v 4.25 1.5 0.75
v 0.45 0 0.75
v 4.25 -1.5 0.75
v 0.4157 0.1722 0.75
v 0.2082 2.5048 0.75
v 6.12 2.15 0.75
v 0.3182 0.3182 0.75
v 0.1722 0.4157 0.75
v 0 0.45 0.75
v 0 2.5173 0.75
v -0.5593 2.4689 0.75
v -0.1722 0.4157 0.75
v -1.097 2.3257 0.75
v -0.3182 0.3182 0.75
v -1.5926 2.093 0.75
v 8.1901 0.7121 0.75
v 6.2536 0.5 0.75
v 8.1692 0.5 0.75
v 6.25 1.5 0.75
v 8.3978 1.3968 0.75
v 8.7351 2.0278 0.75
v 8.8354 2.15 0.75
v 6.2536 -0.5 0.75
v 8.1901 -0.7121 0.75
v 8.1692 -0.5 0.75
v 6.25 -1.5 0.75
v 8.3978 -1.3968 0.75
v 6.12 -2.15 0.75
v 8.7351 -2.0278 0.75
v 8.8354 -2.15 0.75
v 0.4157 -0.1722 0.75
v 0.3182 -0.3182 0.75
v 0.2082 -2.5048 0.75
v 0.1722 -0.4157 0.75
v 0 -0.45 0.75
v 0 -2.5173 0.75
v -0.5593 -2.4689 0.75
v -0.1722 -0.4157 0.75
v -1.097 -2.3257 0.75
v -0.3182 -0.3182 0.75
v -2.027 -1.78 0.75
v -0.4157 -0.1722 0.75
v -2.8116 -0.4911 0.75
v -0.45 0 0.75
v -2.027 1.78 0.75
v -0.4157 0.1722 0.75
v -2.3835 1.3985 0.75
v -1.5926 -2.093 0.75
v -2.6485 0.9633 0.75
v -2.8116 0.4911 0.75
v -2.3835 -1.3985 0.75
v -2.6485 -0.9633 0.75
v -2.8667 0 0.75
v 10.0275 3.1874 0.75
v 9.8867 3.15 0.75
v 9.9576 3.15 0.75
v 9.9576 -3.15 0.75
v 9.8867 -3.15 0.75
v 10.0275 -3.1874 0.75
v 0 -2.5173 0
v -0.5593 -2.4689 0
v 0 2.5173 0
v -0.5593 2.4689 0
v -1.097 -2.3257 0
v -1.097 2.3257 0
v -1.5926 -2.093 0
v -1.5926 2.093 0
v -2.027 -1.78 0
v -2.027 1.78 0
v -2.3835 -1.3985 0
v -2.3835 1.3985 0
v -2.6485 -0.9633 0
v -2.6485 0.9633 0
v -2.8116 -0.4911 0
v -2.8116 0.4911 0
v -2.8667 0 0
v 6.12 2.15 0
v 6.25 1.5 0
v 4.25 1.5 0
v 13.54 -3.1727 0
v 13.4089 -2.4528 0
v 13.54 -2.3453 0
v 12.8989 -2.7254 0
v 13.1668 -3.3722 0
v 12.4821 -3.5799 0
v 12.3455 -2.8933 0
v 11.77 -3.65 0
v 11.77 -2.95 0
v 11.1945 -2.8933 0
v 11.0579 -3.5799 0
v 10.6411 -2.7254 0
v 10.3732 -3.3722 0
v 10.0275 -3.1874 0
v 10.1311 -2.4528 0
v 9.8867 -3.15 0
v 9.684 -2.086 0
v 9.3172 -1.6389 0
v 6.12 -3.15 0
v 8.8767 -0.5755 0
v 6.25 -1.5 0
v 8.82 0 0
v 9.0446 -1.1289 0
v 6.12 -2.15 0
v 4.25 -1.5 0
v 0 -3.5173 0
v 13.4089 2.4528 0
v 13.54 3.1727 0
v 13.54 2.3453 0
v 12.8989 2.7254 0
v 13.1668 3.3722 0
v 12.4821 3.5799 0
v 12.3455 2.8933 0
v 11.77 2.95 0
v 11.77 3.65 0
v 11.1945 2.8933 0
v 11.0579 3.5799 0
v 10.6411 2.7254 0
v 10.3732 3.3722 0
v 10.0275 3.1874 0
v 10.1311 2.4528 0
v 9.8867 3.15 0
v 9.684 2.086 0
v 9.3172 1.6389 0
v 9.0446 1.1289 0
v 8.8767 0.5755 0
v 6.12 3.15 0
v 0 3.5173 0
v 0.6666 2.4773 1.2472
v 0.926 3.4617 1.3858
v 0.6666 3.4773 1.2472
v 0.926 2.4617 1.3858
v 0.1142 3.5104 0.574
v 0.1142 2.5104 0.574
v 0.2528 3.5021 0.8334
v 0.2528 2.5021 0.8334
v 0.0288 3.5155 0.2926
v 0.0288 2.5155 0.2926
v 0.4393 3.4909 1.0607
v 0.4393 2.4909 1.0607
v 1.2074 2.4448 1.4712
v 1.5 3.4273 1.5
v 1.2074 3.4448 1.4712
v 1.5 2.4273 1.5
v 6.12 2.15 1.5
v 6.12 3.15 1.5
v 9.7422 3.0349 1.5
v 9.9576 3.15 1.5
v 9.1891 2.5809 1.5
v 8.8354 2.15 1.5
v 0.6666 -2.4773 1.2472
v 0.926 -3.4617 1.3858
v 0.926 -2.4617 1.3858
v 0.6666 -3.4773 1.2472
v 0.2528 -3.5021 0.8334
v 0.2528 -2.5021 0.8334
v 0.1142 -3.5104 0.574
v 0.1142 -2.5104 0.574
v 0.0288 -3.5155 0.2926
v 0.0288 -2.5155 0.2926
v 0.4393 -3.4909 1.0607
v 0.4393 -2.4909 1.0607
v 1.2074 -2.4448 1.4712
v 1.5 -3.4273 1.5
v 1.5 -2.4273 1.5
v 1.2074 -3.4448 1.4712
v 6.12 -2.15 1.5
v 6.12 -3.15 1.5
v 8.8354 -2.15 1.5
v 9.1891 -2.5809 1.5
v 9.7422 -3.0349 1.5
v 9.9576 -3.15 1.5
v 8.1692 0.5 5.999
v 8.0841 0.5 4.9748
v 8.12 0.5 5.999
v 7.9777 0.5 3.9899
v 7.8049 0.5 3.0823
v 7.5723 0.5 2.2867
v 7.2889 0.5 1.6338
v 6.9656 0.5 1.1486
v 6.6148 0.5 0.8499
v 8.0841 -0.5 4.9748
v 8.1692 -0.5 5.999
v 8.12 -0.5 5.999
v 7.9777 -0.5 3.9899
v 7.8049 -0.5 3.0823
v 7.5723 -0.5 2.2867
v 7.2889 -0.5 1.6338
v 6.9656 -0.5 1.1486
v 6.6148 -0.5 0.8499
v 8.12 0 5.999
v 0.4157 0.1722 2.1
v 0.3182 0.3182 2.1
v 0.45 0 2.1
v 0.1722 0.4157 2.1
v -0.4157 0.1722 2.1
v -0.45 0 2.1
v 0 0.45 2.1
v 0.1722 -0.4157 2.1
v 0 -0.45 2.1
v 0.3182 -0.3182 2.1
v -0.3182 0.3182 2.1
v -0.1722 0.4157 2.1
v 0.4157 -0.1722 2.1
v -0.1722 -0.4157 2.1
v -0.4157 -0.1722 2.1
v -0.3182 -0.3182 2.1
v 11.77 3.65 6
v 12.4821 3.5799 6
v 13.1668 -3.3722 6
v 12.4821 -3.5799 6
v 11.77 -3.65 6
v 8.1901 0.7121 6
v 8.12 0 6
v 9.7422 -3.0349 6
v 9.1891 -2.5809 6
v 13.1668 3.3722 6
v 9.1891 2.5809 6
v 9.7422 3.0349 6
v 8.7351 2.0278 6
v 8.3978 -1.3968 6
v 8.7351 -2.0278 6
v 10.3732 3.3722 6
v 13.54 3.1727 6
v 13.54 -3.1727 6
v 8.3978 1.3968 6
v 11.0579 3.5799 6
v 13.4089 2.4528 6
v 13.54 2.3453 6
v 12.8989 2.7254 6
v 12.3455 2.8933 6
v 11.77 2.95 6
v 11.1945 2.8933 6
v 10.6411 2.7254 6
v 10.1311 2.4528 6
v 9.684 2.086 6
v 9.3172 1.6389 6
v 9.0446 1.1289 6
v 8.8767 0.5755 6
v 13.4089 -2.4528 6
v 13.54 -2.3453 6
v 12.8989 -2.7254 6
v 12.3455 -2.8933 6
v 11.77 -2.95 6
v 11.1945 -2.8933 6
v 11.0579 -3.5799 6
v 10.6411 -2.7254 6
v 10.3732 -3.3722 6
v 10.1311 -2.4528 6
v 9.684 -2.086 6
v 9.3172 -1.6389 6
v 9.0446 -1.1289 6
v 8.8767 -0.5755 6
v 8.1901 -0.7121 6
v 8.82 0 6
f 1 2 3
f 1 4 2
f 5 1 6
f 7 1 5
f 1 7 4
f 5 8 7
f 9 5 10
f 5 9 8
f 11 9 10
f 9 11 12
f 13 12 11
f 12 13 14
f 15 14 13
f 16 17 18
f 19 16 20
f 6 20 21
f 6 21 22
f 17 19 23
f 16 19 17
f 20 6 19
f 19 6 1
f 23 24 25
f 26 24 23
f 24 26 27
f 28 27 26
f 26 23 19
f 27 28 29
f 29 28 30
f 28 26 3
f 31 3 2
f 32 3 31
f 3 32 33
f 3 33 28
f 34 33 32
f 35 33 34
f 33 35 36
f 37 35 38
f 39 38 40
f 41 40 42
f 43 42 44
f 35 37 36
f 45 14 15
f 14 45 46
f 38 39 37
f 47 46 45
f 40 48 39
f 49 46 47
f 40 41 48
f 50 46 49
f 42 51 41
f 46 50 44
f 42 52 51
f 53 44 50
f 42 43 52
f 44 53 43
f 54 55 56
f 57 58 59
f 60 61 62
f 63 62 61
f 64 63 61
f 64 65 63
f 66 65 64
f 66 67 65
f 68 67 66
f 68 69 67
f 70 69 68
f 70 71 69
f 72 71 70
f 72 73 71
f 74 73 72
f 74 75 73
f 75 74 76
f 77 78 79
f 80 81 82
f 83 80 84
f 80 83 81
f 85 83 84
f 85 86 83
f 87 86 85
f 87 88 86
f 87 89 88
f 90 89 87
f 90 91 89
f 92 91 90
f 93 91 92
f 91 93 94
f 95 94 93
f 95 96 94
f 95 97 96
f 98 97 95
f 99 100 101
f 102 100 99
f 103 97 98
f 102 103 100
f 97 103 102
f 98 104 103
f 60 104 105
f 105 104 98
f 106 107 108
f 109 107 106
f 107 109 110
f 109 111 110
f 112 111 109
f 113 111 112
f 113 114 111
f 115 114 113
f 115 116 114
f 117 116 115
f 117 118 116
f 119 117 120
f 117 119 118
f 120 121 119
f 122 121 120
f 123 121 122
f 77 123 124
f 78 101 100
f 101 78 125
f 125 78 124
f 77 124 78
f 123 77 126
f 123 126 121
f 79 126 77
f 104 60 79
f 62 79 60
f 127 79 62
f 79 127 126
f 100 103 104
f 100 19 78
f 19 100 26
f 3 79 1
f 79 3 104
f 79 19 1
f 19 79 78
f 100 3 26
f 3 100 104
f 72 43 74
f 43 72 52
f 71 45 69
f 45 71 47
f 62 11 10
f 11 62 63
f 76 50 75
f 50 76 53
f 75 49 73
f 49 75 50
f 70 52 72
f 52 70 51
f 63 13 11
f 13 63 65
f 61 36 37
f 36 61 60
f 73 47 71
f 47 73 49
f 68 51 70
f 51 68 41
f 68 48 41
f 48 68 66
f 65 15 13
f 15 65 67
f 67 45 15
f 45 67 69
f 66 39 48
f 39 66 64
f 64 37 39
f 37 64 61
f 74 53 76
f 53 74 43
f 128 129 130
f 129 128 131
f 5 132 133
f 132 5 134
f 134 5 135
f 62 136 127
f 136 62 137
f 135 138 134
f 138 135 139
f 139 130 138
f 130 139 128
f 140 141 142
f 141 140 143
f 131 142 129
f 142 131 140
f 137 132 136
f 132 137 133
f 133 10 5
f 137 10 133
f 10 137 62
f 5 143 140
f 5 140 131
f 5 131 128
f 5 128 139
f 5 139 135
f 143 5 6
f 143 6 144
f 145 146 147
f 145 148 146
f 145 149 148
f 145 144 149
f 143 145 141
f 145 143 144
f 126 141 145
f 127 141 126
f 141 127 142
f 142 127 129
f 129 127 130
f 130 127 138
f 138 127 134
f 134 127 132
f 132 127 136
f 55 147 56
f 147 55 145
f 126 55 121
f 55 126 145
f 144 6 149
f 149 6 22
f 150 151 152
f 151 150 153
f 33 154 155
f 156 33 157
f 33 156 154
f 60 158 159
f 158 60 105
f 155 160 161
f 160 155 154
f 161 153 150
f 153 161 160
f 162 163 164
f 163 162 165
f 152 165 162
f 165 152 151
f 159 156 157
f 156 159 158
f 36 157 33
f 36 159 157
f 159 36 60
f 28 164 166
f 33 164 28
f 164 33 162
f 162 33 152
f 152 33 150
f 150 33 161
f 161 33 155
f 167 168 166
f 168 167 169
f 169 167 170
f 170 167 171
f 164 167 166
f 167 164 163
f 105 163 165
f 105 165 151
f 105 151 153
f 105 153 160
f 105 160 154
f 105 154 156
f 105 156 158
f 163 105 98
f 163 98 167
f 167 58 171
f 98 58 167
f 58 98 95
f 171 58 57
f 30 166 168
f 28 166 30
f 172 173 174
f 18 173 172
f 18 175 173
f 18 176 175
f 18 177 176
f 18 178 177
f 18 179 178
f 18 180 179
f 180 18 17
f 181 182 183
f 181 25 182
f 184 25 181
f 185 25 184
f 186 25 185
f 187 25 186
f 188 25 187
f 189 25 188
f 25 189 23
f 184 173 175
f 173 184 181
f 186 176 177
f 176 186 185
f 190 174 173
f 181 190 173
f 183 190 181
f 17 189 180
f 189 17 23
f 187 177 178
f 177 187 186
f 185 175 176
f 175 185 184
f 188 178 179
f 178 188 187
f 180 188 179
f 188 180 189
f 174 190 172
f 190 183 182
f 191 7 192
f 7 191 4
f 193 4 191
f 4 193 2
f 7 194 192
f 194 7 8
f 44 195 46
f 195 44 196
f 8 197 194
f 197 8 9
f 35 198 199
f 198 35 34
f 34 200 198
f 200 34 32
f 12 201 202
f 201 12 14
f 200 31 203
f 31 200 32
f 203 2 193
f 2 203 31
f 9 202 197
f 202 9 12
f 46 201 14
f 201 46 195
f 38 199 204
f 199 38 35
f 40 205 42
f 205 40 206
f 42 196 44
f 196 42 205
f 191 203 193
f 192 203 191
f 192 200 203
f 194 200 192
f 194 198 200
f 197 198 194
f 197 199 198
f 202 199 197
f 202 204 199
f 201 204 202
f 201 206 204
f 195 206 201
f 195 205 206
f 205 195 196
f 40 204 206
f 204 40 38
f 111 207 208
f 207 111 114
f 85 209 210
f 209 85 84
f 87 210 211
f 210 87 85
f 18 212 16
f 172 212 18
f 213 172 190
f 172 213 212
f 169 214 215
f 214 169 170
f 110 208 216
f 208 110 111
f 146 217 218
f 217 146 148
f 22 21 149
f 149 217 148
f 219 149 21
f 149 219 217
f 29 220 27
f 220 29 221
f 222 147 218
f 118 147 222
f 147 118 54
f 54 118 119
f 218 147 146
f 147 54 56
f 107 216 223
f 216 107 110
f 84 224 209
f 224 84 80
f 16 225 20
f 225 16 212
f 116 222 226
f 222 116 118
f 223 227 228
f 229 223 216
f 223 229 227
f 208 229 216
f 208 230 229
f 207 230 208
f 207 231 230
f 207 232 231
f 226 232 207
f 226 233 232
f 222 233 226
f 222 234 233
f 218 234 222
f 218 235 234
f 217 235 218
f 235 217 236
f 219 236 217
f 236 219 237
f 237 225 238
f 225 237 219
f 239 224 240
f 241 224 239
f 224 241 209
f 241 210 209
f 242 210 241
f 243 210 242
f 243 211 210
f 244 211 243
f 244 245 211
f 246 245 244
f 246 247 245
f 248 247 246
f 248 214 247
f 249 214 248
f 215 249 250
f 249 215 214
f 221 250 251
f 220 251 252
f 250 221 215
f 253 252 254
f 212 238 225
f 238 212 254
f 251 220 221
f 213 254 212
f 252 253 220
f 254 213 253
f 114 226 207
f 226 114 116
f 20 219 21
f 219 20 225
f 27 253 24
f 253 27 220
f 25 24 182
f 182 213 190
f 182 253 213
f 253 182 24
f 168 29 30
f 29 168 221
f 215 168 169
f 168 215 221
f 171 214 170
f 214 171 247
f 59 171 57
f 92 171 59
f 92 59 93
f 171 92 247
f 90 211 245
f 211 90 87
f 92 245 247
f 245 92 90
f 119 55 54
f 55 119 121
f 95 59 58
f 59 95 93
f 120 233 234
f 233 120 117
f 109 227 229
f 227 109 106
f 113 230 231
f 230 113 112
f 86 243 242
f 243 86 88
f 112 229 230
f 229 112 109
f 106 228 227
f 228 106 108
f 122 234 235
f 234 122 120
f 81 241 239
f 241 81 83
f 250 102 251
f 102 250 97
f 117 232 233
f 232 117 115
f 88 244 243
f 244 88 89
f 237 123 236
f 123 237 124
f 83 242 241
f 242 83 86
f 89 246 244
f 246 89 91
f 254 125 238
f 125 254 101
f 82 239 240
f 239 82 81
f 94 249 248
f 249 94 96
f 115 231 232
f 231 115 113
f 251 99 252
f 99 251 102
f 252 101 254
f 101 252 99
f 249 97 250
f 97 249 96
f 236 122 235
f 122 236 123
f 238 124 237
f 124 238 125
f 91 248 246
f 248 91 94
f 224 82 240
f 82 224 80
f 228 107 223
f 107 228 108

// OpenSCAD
// This work uses the  Creative Commons Attribution-Noncommercial-Share Alike license
// https://creativecommons.org/licenses/by-nc-sa/1.0/ © 2016, Stefan Kohlbrecher.

//Diameter of props
prop_diameter = 45.5;

//Desired prop to prop distance
prop_prop_distance = 2.08829;

// Motor diameter. It is recommended to make this a little smaller than actual motor diameter (e.g. 5.9 for 6mm motors)
motor_diameter=5.9;

// Thickness of motor clamp
motor_clamp_thickness = 0.7;

// Height of motor clamp
motor_clamp_height = 6.0;

// Width of motor clamp reinforcement strut
motor_clamp_top_reinforcement_width = 1;

// 0 makes motor clamp half circle, values up to 1 make it go further around the motor
motor_clamp_cutoff_factor = 0.6;

//Diagonal length of PCB from arm end to arm end. Given default correct for H8/H101.
pcb_diagonal_length = 56;

// Distance between the mounting pin and the edge of the flight controller. This is constant for a given flight controller. Given default correct for H8/H101
dist_hole_edge = 6.12;

// Distance of motor to center of pcb
dist_center_pcb_to_motor = ((prop_diameter + prop_prop_distance)/2) * sqrt(2);
//echo (dist_center_pcb_to_motor);

// Diameter of the pin for the hole in the frame
pin_diameter = 0.9;

// Length/height of the pin for the hole in the frame
pin_length = 1.35;

// Height of the main plate
plate_thickness = 0.75;

// Width of main plate
plate_width = 4.3;

// Arm widening per mm. For arms that are conical shape. Given default correct for H8/H101
arm_widening_per_mm = 0.060013;

// Side strengthening dist from arm end
side_strengthening_length_inward = dist_hole_edge;

// Height of the side reinforcement structure
side_strengthening_height = 1.5;

// Size of SMD LED hole (x)
smd_led_size_x = 2.0;

// Size of SMD LED hole (y/width)
smd_led_size_y = 3;

// Distance of SMD LED hole wrt pin
smd_led_offset_x = 5.25;

// Width of the reinforcement half circles near SMD LED
smd_led_side_reinforcement_width = 1.0;

// Distance of arm knot notch 
//arm_knot_notch_offset_x = 3.93;

// Arm knot notch radius
//arm_knot_notch_radius = 1;

// Arm knot notch center_z;
//arm_knot_notch_offset_z = 2.65;

//Additional distance beyond the edge of the frame for the clamp
dist_additional = dist_center_pcb_to_motor - (pcb_diagonal_length/2 + motor_diameter/2+motor_clamp_thickness);
//echo (dist_additional);


// Base plate with removed smd led rectangle
module BasePlate(){

  union(){
    scale ([plate_width/1.5,plate_width/2+arm_widening_per_mm*side_strengthening_length_inward,1]) cylinder(r=1,h=plate_thickness,$fn=32);
    difference(){
      translate([0,-plate_width/2]) cube([ dist_hole_edge + dist_additional + motor_clamp_thickness,plate_width,plate_thickness]);
      translate([smd_led_offset_x-smd_led_size_x/2,-smd_led_size_y/2,-0.5]) cube([smd_led_size_x,smd_led_size_y,10.0]);
    }
  }
}

// Side reinforcement. Avoids breaking due to bending.
module SideReinforcement(){
  //intersection(){
  //  rotate([90,0,0]) cylinder(r=smd_led_size_x,h=smd_led_side_reinforcement_width,$fn=16);
  //  translate([0,0,smd_led_size_x]) cube([smd_led_size_x*2, smd_led_size_x*2, smd_led_size_x*2], center = true);
  //}

  translate([0,-smd_led_side_reinforcement_width,0]) cube([dist_additional +motor_diameter/2+motor_clamp_thickness, smd_led_side_reinforcement_width, side_strengthening_height]);

  side_reinf_gap_fill = [[0,0],
        [-side_strengthening_length_inward,-arm_widening_per_mm*side_strengthening_length_inward],
        [-side_strengthening_length_inward,arm_widening_per_mm*side_strengthening_length_inward]]; 

  translate([0,-smd_led_side_reinforcement_width,plate_thickness/2])
  linear_extrude(height = plate_thickness, center = true, convexity = 0, twist = 0)
  polygon(side_reinf_gap_fill);


  side_reinf_angled = [[0,0],
        [0,smd_led_side_reinforcement_width],
        [-side_strengthening_length_inward,smd_led_side_reinforcement_width+arm_widening_per_mm*side_strengthening_length_inward],
        [-side_strengthening_length_inward,+arm_widening_per_mm*side_strengthening_length_inward]]; 
 
difference(){ 
  translate([0,-smd_led_side_reinforcement_width,side_strengthening_height/2])
  linear_extrude(height = side_strengthening_height, center = true, convexity = 0, twist = 0)
  polygon(side_reinf_angled);


  translate([-side_strengthening_length_inward+side_strengthening_height,arm_widening_per_mm*side_strengthening_length_inward,0])
  rotate ([90,0,0])
  difference(){
    translate ([-side_strengthening_height*2,0,-side_strengthening_height/2]) cube([side_strengthening_height*2, side_strengthening_height*2, side_strengthening_height*2]);
    cylinder(r=side_strengthening_height,h=smd_led_side_reinforcement_width*5,$fn=32, center = true);
    
  }
}
}



module FrameHolePin()
{
  translate([0,0,plate_thickness]) cylinder(r=pin_diameter/2,h=pin_length,$fn=16);
}

// Clip is too filigrane, doesnt print well. Keeping it for anyone interested to try
module FrameHolePinTopClip()
{
  // Unused. top clip does not print properly
  top_clip_pin_length = 0.5;
  // Unused. top clip does not print properly
  top_clip_slit_size_x = 5;
  // Unused. top clip does not print properly
  top_clip_slit_size_y = 0.3;
  difference(){
    translate([0,0,pin_length])  cylinder(r1=(pin_diameter/2)*1.00, r2=(pin_diameter/2)*1.65,h=top_clip_pin_length,$fn=16);
    translate([0,0,pin_length+top_clip_pin_length])  cube([top_clip_slit_size_x, top_clip_slit_size_y, top_clip_pin_length*2], center = true);
  }
}

module ClampSideReinforcement()
{
  a = [[dist_hole_edge,plate_width/2],
        [dist_hole_edge + dist_additional +motor_diameter/2+motor_clamp_thickness,0],
        [dist_hole_edge + dist_additional +motor_diameter/2+motor_clamp_thickness,motor_diameter/2+motor_clamp_thickness]]; 



  translate([0,0,plate_thickness/2])
  linear_extrude(height = plate_thickness, center = true, convexity = 0, twist = 0)
  polygon(a);

}

module ClampTopReinforcement()
{
  scale_x = (dist_hole_edge + dist_additional) - (smd_led_offset_x+smd_led_size_x/2);
  scale_y = motor_clamp_height - plate_thickness;
  

  translate([smd_led_offset_x+smd_led_size_x/2,-motor_clamp_top_reinforcement_width/2,plate_thickness+scale_y-0.001])
  rotate([-90,0,0])
  scale([scale_x,scale_y,1])

  {
    difference()
    {
      cube([1, 1, motor_clamp_top_reinforcement_width]);
      translate([0,0,-motor_clamp_top_reinforcement_width/2]) cylinder(r=1, h=motor_clamp_top_reinforcement_width*2,$fn=32);
    }
    scale([1,1,1]) translate([1,0,0])
    cube ([1,1,motor_clamp_top_reinforcement_width]); 
  }
}

//Collects all basic geometry To make it easy to cut out the motor hole and clamp cutoff at the end
module BasicGeom()
{
   FrameHolePin();
   //FrameHolePinTopClip();
   
union(){
   BasePlate();
    //Add side reinforcement at LED hole
    mirror([0,1,0]){
      translate([dist_hole_edge,plate_width/2+smd_led_side_reinforcement_width,0]) SideReinforcement();
    }

    translate([dist_hole_edge,plate_width/2+smd_led_side_reinforcement_width,0]) SideReinforcement();

    //translate([dist_hole_edge,-plate_width/2+0.01,0]) SideReinforcement();
}

    translate([dist_hole_edge + dist_additional +motor_diameter/2+motor_clamp_thickness ,0])
    cylinder(r=motor_diameter/2+motor_clamp_thickness,h=motor_clamp_height,$fn=32);

    ClampSideReinforcement();
    scale([1,-1,1]) ClampSideReinforcement();

    ClampTopReinforcement();
}

module ClampCutOut()
{
  translate([dist_hole_edge + dist_additional +motor_diameter/2+motor_clamp_thickness ,0])
  union(){
    translate([0,0,-0.15]) cylinder(r=motor_diameter/2,h=motor_clamp_height*1.5,$fn=32);
    translate([(motor_diameter/2)*motor_clamp_cutoff_factor,-motor_diameter*2,-motor_diameter*2]) cube(dist_center_pcb_to_motor, motor_diameter*4, motor_diameter*4);
  }
}


module MotorMount()
{
  difference(){
    BasicGeom();
    ClampCutOut();
  }
}

module ArmKnotNotch()
{
  translate([arm_knot_notch_offset_x,0,arm_knot_notch_offset_z])
  rotate ([90,0,0])
  cylinder(r=arm_knot_notch_radius,h=10,$fn=32, center = true);
}

difference(){
  MotorMount();
  //ArmKnotNotch();
}
